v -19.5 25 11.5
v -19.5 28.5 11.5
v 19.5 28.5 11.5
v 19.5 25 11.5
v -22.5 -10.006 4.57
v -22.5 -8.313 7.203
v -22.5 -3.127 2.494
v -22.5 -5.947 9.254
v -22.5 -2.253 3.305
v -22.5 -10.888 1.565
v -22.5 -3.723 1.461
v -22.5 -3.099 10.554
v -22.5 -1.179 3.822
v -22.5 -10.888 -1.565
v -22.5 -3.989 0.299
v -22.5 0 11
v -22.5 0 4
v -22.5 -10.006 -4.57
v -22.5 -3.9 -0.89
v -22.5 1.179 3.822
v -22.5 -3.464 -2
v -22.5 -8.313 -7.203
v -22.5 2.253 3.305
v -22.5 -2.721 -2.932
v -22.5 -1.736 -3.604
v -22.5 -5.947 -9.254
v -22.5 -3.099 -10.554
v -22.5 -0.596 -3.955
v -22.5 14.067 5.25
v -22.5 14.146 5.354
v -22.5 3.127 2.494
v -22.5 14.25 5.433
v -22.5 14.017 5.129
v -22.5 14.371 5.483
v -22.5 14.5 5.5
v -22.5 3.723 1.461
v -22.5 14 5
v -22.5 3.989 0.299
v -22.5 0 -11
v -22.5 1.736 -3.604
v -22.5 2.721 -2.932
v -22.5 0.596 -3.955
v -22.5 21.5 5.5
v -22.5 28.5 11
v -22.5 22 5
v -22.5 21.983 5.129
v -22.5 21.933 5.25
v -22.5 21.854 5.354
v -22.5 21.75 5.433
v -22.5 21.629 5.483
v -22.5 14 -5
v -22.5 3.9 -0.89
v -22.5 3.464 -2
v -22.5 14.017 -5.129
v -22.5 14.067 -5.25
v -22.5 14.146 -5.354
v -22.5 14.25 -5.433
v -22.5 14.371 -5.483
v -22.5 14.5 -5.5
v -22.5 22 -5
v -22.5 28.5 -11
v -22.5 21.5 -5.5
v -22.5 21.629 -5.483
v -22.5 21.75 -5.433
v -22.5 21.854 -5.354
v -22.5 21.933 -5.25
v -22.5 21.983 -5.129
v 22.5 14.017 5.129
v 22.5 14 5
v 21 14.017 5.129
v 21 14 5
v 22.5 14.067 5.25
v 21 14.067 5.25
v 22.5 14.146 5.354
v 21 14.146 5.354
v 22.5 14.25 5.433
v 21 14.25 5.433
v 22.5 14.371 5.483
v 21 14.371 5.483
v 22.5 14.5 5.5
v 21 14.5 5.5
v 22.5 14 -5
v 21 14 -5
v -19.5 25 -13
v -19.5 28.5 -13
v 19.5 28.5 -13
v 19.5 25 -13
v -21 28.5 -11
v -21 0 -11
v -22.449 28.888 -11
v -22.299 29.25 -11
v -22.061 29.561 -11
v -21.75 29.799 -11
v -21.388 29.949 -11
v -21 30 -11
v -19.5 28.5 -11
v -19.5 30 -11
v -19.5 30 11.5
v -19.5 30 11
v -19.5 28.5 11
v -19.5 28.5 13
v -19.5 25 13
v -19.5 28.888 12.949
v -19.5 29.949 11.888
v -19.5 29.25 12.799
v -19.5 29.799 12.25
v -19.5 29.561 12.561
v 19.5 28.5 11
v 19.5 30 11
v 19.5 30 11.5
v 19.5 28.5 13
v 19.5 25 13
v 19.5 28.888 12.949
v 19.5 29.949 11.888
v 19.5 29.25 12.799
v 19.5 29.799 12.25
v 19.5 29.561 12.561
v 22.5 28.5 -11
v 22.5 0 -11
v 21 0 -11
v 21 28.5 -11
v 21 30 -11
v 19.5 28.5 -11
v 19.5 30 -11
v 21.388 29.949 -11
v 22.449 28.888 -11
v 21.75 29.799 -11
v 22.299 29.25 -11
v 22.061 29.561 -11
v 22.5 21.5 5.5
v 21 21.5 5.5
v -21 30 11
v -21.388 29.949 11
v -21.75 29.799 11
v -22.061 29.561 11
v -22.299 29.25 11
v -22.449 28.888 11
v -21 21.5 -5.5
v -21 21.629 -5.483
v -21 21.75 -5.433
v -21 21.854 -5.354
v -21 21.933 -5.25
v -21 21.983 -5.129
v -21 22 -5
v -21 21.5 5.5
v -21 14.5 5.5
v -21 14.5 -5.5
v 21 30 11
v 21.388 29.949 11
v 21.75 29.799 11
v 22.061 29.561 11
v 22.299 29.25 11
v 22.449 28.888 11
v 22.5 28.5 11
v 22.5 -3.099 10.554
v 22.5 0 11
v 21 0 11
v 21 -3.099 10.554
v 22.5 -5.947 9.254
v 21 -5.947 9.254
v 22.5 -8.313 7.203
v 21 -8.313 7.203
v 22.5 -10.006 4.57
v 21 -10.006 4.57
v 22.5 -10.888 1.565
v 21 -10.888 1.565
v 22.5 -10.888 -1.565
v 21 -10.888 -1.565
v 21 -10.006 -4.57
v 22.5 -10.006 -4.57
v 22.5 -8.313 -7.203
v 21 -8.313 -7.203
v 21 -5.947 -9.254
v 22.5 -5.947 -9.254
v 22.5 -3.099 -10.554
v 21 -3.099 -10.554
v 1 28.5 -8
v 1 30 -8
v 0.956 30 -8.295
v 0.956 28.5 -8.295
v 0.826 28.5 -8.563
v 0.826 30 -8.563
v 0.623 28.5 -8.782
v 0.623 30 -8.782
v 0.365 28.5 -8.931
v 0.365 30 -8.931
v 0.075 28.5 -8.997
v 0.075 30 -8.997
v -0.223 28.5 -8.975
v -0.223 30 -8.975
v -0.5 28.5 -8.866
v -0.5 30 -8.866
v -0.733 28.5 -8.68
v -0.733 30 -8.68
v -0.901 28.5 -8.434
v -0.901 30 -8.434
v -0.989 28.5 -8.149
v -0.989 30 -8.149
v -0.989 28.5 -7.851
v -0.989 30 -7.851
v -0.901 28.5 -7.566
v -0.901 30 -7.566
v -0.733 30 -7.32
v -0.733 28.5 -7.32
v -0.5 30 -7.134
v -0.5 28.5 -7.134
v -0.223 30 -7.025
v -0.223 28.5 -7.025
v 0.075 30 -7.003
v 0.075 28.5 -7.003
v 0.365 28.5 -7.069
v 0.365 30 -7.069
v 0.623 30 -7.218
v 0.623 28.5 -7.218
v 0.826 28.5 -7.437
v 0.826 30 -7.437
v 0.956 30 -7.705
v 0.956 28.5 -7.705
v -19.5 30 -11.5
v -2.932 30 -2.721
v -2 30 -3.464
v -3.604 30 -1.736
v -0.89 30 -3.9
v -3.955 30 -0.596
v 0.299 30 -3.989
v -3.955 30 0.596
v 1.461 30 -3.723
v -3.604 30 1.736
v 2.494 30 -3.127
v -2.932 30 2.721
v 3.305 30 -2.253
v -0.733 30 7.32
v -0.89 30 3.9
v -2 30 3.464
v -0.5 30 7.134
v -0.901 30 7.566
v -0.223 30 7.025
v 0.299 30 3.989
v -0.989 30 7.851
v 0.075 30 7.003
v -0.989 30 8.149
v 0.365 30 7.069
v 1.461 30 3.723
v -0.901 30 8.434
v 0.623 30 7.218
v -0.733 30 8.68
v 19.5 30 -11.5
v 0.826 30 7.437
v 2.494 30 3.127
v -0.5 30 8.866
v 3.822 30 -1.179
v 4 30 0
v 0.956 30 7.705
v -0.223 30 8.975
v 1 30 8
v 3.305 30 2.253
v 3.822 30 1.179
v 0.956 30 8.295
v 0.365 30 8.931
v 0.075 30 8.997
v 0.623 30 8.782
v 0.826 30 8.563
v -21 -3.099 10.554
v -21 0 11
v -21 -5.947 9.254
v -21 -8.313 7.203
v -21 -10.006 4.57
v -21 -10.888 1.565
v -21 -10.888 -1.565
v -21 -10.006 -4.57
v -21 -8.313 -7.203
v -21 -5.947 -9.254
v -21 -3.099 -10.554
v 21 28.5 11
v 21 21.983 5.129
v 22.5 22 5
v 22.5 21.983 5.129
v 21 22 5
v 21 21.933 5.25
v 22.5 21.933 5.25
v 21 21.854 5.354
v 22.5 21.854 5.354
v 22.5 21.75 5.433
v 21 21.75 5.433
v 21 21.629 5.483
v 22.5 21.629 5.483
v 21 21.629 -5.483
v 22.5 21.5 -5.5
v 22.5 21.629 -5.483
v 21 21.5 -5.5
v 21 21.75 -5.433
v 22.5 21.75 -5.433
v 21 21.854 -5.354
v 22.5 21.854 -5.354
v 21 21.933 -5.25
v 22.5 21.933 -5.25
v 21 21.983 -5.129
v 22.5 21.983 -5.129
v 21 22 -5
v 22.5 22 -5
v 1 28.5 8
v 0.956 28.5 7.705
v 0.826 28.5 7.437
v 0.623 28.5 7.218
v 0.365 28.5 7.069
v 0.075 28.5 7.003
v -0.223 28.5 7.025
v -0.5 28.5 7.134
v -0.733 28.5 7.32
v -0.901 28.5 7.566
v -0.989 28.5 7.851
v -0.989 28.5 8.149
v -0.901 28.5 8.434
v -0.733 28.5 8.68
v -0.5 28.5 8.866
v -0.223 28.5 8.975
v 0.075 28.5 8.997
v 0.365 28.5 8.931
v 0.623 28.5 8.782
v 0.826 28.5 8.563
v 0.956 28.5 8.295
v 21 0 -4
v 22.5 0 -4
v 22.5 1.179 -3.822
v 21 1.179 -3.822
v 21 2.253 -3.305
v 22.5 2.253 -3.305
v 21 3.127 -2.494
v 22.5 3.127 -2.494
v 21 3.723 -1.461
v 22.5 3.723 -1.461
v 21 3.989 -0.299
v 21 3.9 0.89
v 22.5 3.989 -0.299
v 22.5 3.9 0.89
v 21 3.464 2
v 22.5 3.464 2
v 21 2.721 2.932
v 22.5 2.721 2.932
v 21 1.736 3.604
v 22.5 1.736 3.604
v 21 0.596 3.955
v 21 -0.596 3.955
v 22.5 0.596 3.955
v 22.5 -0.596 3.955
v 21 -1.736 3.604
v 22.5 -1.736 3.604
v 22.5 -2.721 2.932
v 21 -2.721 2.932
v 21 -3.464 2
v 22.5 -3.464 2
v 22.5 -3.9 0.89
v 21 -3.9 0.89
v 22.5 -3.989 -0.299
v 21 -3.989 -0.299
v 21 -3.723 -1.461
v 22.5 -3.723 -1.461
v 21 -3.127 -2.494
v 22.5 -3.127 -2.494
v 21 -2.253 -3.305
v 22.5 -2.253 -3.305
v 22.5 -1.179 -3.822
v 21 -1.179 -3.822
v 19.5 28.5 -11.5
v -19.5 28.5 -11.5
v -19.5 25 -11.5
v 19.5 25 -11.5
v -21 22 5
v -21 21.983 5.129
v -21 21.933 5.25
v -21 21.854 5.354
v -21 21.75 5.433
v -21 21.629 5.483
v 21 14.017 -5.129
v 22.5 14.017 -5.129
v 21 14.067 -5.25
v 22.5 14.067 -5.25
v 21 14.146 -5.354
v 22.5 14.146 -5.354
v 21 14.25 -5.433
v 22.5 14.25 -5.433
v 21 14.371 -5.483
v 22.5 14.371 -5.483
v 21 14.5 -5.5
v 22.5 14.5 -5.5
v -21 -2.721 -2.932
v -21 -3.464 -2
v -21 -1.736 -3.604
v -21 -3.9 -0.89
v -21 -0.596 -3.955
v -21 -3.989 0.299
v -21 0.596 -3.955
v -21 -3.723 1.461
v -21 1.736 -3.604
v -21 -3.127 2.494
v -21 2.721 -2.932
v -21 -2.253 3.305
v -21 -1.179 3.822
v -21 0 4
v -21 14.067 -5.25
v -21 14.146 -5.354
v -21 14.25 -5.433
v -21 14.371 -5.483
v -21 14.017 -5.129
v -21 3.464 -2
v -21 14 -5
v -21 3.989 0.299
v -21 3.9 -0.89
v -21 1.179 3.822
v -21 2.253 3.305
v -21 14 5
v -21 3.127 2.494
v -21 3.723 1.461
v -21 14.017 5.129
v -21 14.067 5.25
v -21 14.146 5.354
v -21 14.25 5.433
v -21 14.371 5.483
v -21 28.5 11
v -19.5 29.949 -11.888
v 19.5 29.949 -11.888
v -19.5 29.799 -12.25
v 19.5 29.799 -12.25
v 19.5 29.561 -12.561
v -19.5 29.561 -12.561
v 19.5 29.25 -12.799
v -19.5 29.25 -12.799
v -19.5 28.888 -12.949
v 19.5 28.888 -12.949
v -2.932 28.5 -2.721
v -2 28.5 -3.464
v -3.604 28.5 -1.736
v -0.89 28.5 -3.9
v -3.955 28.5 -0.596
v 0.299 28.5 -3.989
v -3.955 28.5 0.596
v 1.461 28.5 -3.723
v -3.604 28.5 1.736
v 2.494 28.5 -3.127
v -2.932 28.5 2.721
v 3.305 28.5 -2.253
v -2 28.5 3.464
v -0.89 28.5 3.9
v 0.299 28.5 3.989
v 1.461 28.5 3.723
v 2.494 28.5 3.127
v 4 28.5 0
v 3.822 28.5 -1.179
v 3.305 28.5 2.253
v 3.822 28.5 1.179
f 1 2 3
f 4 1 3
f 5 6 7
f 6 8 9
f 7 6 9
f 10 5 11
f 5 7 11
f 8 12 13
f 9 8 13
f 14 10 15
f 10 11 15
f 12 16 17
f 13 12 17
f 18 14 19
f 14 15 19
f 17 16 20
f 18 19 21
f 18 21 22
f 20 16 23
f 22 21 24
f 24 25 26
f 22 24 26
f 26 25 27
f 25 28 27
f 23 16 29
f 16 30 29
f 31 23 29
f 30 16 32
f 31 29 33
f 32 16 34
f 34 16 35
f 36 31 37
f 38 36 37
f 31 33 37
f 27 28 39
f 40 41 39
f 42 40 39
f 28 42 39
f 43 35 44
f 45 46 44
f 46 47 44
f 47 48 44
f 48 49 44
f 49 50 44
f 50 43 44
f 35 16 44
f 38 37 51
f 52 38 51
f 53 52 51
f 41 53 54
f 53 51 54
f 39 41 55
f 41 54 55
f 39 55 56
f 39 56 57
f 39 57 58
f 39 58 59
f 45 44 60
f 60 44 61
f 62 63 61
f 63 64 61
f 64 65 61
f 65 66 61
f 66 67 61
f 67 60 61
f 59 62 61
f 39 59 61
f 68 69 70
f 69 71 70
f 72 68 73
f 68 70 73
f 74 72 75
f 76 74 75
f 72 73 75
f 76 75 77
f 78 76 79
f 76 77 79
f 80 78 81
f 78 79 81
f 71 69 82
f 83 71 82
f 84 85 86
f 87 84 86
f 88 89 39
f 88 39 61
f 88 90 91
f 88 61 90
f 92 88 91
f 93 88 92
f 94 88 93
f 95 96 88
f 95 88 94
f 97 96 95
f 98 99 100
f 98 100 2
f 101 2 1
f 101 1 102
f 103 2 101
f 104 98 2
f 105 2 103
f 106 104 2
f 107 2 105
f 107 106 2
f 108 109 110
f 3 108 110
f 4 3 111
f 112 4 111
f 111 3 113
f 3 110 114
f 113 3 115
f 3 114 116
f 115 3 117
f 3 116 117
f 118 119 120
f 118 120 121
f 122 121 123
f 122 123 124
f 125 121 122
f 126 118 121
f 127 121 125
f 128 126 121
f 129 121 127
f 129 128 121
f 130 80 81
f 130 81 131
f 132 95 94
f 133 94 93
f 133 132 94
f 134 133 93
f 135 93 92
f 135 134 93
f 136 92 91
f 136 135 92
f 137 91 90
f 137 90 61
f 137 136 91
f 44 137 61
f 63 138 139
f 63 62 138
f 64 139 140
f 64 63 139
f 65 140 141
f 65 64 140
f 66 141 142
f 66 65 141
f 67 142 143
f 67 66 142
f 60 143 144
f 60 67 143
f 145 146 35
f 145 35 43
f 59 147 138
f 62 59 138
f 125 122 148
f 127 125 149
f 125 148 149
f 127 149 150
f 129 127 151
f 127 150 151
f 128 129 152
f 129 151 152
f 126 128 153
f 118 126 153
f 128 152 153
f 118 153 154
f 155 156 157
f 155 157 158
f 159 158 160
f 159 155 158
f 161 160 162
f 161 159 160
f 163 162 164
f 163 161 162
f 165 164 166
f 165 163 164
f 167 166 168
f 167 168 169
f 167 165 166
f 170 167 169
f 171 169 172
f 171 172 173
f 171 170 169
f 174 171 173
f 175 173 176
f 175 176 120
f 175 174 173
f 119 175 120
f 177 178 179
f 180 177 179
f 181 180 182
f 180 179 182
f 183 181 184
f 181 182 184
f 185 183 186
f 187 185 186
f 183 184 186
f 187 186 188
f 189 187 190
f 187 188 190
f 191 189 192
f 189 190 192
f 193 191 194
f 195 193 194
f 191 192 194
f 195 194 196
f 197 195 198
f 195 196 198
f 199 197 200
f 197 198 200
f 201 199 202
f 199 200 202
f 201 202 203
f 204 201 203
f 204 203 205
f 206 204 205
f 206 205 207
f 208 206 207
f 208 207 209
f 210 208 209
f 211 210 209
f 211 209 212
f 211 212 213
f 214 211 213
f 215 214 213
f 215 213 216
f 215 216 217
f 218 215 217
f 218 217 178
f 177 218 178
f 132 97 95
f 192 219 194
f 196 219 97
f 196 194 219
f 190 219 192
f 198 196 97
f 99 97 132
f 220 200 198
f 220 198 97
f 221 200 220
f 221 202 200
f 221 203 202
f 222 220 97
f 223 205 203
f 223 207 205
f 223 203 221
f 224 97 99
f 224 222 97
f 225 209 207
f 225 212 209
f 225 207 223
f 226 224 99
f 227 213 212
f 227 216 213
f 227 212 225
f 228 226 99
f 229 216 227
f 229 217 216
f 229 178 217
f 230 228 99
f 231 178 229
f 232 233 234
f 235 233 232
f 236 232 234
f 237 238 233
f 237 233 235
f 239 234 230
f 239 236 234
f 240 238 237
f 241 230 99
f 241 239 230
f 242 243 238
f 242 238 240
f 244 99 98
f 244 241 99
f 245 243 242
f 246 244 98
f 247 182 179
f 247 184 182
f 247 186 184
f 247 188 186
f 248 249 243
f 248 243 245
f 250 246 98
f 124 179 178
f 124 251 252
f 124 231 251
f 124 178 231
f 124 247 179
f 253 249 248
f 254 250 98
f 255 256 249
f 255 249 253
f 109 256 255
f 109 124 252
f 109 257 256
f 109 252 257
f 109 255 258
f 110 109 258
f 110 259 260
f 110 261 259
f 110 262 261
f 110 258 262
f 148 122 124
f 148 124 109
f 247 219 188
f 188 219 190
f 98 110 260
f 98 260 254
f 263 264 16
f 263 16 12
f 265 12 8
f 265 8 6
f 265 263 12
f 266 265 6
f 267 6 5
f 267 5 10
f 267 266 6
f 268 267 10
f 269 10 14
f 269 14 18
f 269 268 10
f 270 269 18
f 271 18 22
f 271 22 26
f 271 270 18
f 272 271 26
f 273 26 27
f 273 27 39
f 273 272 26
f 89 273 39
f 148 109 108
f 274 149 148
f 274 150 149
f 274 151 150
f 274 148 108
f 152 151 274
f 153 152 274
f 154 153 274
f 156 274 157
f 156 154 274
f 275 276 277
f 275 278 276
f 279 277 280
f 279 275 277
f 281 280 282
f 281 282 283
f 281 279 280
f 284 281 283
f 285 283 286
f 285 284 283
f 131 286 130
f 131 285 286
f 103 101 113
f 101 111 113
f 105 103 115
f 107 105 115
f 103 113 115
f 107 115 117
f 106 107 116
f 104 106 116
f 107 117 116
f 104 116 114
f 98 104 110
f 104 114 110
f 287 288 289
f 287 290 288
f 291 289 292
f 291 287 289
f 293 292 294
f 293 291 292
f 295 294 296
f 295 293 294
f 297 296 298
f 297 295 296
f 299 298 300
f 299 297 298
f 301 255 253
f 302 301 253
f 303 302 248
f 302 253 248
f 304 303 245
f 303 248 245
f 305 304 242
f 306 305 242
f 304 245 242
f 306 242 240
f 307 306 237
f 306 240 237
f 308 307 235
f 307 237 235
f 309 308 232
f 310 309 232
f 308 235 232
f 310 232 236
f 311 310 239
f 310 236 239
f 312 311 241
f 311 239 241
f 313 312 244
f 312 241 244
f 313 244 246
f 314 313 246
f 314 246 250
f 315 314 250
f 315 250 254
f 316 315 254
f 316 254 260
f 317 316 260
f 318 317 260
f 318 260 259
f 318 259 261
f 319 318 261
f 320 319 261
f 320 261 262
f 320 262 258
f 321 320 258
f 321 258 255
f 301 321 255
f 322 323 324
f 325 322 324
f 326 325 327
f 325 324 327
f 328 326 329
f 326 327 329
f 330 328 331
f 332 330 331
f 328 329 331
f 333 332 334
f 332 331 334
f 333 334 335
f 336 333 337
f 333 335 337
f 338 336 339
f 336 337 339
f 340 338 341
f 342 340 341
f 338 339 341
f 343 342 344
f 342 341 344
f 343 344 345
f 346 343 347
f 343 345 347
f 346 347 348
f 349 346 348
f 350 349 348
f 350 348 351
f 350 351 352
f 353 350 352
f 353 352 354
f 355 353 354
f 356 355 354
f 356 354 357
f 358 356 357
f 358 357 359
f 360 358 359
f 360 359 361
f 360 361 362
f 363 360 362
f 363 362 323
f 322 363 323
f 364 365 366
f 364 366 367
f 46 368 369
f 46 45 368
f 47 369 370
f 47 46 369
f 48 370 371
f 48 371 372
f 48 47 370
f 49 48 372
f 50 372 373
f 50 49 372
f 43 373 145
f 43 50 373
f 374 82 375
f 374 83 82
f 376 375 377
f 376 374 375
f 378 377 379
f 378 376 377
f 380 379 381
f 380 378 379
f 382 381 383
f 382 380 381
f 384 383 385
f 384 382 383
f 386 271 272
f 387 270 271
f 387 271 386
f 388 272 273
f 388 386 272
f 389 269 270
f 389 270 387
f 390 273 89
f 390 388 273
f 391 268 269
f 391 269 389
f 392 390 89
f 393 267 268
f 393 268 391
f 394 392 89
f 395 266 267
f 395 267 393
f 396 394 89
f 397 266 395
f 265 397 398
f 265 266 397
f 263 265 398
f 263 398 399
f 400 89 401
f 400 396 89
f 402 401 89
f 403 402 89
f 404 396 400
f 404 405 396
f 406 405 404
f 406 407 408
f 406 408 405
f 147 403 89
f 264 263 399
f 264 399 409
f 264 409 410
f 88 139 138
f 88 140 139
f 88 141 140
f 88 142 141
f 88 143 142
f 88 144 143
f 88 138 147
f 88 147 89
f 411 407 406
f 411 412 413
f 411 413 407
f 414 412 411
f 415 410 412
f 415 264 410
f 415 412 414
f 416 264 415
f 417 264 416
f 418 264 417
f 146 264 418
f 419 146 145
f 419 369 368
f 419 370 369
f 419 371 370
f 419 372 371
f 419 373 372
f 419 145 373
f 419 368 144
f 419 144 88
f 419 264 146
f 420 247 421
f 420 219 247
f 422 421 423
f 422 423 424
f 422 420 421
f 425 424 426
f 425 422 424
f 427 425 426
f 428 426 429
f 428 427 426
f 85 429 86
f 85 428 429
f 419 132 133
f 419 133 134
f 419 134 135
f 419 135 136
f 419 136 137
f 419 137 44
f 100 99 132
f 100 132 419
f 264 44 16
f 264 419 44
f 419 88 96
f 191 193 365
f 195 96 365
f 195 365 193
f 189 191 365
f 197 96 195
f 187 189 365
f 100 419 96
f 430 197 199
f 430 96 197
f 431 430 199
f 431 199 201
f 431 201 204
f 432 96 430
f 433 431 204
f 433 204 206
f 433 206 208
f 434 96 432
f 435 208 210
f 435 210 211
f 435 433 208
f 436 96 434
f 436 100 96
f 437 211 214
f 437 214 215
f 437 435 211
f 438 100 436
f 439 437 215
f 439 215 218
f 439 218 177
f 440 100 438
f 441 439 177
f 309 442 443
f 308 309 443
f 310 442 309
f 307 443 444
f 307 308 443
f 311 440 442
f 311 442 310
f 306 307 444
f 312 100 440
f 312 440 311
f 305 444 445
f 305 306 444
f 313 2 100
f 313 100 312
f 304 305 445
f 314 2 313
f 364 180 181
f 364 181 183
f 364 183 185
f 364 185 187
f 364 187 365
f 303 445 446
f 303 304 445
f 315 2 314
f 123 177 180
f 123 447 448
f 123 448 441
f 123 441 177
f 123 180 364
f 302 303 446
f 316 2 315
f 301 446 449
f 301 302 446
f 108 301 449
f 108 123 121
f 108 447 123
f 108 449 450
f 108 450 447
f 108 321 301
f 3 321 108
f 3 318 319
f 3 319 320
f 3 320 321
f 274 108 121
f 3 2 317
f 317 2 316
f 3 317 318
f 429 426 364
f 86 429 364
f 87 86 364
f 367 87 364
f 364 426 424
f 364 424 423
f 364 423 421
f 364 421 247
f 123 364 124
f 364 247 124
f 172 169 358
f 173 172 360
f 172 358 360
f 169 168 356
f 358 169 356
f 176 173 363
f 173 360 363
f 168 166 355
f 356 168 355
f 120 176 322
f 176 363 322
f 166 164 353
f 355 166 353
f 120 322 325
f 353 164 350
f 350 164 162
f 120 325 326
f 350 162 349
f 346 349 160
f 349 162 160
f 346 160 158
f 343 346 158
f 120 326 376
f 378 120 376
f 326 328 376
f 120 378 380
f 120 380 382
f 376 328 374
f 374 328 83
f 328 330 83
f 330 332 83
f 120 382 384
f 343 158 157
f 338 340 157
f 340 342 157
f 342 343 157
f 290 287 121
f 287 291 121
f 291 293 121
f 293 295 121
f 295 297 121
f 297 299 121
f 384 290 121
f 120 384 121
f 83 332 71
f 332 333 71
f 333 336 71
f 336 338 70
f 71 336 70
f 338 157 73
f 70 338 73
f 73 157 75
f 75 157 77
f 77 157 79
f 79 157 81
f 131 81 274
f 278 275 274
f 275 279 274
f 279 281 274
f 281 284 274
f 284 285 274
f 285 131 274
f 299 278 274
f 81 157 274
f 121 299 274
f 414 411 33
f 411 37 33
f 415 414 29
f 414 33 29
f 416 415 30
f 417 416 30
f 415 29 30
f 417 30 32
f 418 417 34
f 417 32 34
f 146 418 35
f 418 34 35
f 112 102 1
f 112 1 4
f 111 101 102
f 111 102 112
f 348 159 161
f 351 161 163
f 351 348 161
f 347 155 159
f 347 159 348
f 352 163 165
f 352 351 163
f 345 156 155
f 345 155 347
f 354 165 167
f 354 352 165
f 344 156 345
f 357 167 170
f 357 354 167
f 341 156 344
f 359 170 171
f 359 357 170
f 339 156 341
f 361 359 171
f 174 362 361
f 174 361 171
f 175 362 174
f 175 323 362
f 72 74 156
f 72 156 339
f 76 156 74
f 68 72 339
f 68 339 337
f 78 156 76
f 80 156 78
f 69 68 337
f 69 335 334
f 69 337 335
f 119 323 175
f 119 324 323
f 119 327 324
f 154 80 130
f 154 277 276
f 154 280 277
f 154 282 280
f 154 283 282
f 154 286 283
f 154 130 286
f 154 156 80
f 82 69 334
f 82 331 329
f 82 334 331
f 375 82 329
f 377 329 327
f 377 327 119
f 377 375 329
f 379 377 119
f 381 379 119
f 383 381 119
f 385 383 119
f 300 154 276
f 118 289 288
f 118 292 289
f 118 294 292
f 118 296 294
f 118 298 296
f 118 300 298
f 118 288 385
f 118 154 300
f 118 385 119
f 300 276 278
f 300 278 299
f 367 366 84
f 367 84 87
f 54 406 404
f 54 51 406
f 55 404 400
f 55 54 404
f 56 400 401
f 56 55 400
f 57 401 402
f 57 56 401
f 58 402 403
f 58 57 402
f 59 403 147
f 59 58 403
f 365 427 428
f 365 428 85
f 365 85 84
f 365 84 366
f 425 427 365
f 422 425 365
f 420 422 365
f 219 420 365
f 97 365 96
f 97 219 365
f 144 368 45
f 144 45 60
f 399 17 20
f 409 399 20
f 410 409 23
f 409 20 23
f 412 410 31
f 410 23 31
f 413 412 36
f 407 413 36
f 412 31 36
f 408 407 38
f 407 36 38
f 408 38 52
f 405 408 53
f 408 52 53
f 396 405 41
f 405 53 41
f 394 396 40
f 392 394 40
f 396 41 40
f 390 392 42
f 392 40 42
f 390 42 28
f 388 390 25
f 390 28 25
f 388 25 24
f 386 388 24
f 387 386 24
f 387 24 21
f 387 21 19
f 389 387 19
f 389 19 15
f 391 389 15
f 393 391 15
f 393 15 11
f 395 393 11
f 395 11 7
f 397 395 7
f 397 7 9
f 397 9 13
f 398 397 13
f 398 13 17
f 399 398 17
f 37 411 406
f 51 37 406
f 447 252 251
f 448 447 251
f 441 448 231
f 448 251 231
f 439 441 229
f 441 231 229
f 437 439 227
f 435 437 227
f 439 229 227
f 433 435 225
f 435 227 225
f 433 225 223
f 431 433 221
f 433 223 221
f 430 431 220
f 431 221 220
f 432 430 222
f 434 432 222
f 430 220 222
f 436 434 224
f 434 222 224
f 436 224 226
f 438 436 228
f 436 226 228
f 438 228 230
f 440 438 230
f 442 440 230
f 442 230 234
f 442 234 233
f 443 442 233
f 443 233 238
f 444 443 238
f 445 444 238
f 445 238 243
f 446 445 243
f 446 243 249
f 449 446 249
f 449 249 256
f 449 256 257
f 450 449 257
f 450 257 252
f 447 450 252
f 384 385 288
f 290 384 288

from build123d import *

# Parameters (mm, degrees)
BOSS_EXTRUDE1_DEPTH          = 45
SKETCH2_W                    = 42
SKETCH2_H                    = 46.212418486
CUT_EXTRUDE1_DEPTH           = 23
SKETCH3_W                    = 39
SKETCH3_H                    = 1.5
BOSS_EXTRUDE2_DEPTH          = 2
SKETCH4_W                    = 39
SKETCH4_H                    = 1.5
BOSS_EXTRUDE3_DEPTH          = 3.5
SKETCH5_W                    = 39
SKETCH5_H                    = 1.5
BOSS_EXTRUDE4_DEPTH          = 2
SKETCH6_W                    = 39
SKETCH6_H                    = 1.5
BOSS_EXTRUDE5_DEPTH          = 3.5
F_8_0_8_DIAMETER_HOLE1_D     = 8
F_8_0_8_DIAMETER_HOLE1_DEPTH = 1.5
F_8_0_8_DIAMETER_HOLE2_D     = 8
F_8_0_8_DIAMETER_HOLE2_DEPTH = 1.5
F_8_0_8_DIAMETER_HOLE3_D     = 8
F_8_0_8_DIAMETER_HOLE3_DEPTH = 1.5
FILLET1_R                    = 1.5
SKETCH13_R                   = 1
CUT_EXTRUDE2_DEPTH           = 2
SKETCH14_W                   = 11
SKETCH14_H                   = 8
CUT_EXTRUDE3_DEPTH           = 45
FILLET2_R                    = 0.5


with BuildPart() as part:
    # Sketch1 → Boss-Extrude1 (new body)
    with BuildSketch(Plane(origin=(22.5, 0, 0), x_dir=(0, 0, -1), z_dir=(1, 0, 0))):
        with BuildLine():
            Line((-11, 30), (-11, 0))
            ThreePointArc((-11, 0), (0, -11), (11, 0))
            Line((11, 0), (11, 30))
            Line((11, 30), (-11, 30))
        make_face()
    extrude(amount=-BOSS_EXTRUDE1_DEPTH)

    # Sketch2 → Cut-Extrude1 (cut, through all)
    with BuildSketch(Plane.XY.offset(11)):
        with Locations((0, 5.393790757)):
            Rectangle(SKETCH2_W, SKETCH2_H)
    extrude(amount=-CUT_EXTRUDE1_DEPTH, mode=Mode.SUBTRACT)

    # Sketch3 → Boss-Extrude2 (add)
    with BuildSketch(Plane(origin=(0, 0, -11), x_dir=(-1, 0, 0), z_dir=(0, 0, -1))):
        with Locations((0, 29.25)):
            Rectangle(SKETCH3_W, SKETCH3_H)
    extrude(amount=BOSS_EXTRUDE2_DEPTH)

    # Sketch4 → Boss-Extrude3 (add)
    with BuildSketch(Plane.XZ.offset(-28.5)):
        with Locations((0, -12.25)):
            Rectangle(SKETCH4_W, SKETCH4_H)
    extrude(amount=BOSS_EXTRUDE3_DEPTH)

    # Sketch5 → Boss-Extrude4 (add)
    with BuildSketch(Plane.XY.offset(11)):
        with Locations((0, 29.25)):
            Rectangle(SKETCH5_W, SKETCH5_H)
    extrude(amount=BOSS_EXTRUDE4_DEPTH)

    # Sketch6 → Boss-Extrude5 (add)
    with BuildSketch(Plane.XZ.offset(-28.5)):
        with Locations((0, 12.25)):
            Rectangle(SKETCH6_W, SKETCH6_H)
    extrude(amount=BOSS_EXTRUDE5_DEPTH)

    # Ø8.0 (8) Diameter Hole1
    with Locations(Plane(origin=(0, 28.5, 0), x_dir=(-1, 0, 0), z_dir=(0, -1, 0))):
        with Locations((0, 0)):
            Hole(F_8_0_8_DIAMETER_HOLE1_D / 2, depth=F_8_0_8_DIAMETER_HOLE1_DEPTH)

    # Ø8.0 (8) Diameter Hole2
    with Locations(Plane(origin=(-21, 0, 0), x_dir=(0, 0, -1), z_dir=(1, 0, 0))):
        with Locations((0, 0)):
            Hole(F_8_0_8_DIAMETER_HOLE2_D / 2, depth=F_8_0_8_DIAMETER_HOLE2_DEPTH)

    # Ø8.0 (8) Diameter Hole3
    with Locations(Plane.ZY.offset(-21)):
        with Locations((0, 0)):
            Hole(F_8_0_8_DIAMETER_HOLE3_D / 2, depth=F_8_0_8_DIAMETER_HOLE3_DEPTH)

    # Fillet1
    fillet1_edges = [part.edges().sort_by_distance(p)[0] for p in [
        (0, 30, -13),
        (-22.5, 30, 0),
        (22.5, 30, 0),
        (0, 30, 13),
    ]]
    fillet(fillet1_edges, radius=FILLET1_R)

    # Sketch13 → Cut-Extrude2 (cut)
    with BuildSketch(Plane(origin=(0, 30, 0), x_dir=(1, 0, 0), z_dir=(0, 1, 0))):
        with Locations((0, 8)):
            Circle(SKETCH13_R)
        with Locations((0, -8)):
            Circle(SKETCH13_R)
    extrude(amount=-CUT_EXTRUDE2_DEPTH, mode=Mode.SUBTRACT)

    # Sketch14 → Cut-Extrude3 (cut)
    with BuildSketch(Plane(origin=(22.5, 0, 0), x_dir=(0, 0, -1), z_dir=(1, 0, 0))):
        with Locations((0, 18)):
            Rectangle(SKETCH14_W, SKETCH14_H)
    extrude(amount=-CUT_EXTRUDE3_DEPTH, mode=Mode.SUBTRACT)

    # Fillet2
    fillet2_edges = [part.edges().sort_by_distance(p)[0] for p in [
        (-21.75, 14, 5.5),
        (21.75, 14, 5.5),
        (-21.75, 22, 5.5),
        (21.75, 22, 5.5),
        (-21.75, 22, -5.5),
        (21.75, 22, -5.5),
        (-21.75, 14, -5.5),
        (21.75, 14, -5.5),
    ]]
    fillet(fillet2_edges, radius=FILLET2_R)


solid = part.part
